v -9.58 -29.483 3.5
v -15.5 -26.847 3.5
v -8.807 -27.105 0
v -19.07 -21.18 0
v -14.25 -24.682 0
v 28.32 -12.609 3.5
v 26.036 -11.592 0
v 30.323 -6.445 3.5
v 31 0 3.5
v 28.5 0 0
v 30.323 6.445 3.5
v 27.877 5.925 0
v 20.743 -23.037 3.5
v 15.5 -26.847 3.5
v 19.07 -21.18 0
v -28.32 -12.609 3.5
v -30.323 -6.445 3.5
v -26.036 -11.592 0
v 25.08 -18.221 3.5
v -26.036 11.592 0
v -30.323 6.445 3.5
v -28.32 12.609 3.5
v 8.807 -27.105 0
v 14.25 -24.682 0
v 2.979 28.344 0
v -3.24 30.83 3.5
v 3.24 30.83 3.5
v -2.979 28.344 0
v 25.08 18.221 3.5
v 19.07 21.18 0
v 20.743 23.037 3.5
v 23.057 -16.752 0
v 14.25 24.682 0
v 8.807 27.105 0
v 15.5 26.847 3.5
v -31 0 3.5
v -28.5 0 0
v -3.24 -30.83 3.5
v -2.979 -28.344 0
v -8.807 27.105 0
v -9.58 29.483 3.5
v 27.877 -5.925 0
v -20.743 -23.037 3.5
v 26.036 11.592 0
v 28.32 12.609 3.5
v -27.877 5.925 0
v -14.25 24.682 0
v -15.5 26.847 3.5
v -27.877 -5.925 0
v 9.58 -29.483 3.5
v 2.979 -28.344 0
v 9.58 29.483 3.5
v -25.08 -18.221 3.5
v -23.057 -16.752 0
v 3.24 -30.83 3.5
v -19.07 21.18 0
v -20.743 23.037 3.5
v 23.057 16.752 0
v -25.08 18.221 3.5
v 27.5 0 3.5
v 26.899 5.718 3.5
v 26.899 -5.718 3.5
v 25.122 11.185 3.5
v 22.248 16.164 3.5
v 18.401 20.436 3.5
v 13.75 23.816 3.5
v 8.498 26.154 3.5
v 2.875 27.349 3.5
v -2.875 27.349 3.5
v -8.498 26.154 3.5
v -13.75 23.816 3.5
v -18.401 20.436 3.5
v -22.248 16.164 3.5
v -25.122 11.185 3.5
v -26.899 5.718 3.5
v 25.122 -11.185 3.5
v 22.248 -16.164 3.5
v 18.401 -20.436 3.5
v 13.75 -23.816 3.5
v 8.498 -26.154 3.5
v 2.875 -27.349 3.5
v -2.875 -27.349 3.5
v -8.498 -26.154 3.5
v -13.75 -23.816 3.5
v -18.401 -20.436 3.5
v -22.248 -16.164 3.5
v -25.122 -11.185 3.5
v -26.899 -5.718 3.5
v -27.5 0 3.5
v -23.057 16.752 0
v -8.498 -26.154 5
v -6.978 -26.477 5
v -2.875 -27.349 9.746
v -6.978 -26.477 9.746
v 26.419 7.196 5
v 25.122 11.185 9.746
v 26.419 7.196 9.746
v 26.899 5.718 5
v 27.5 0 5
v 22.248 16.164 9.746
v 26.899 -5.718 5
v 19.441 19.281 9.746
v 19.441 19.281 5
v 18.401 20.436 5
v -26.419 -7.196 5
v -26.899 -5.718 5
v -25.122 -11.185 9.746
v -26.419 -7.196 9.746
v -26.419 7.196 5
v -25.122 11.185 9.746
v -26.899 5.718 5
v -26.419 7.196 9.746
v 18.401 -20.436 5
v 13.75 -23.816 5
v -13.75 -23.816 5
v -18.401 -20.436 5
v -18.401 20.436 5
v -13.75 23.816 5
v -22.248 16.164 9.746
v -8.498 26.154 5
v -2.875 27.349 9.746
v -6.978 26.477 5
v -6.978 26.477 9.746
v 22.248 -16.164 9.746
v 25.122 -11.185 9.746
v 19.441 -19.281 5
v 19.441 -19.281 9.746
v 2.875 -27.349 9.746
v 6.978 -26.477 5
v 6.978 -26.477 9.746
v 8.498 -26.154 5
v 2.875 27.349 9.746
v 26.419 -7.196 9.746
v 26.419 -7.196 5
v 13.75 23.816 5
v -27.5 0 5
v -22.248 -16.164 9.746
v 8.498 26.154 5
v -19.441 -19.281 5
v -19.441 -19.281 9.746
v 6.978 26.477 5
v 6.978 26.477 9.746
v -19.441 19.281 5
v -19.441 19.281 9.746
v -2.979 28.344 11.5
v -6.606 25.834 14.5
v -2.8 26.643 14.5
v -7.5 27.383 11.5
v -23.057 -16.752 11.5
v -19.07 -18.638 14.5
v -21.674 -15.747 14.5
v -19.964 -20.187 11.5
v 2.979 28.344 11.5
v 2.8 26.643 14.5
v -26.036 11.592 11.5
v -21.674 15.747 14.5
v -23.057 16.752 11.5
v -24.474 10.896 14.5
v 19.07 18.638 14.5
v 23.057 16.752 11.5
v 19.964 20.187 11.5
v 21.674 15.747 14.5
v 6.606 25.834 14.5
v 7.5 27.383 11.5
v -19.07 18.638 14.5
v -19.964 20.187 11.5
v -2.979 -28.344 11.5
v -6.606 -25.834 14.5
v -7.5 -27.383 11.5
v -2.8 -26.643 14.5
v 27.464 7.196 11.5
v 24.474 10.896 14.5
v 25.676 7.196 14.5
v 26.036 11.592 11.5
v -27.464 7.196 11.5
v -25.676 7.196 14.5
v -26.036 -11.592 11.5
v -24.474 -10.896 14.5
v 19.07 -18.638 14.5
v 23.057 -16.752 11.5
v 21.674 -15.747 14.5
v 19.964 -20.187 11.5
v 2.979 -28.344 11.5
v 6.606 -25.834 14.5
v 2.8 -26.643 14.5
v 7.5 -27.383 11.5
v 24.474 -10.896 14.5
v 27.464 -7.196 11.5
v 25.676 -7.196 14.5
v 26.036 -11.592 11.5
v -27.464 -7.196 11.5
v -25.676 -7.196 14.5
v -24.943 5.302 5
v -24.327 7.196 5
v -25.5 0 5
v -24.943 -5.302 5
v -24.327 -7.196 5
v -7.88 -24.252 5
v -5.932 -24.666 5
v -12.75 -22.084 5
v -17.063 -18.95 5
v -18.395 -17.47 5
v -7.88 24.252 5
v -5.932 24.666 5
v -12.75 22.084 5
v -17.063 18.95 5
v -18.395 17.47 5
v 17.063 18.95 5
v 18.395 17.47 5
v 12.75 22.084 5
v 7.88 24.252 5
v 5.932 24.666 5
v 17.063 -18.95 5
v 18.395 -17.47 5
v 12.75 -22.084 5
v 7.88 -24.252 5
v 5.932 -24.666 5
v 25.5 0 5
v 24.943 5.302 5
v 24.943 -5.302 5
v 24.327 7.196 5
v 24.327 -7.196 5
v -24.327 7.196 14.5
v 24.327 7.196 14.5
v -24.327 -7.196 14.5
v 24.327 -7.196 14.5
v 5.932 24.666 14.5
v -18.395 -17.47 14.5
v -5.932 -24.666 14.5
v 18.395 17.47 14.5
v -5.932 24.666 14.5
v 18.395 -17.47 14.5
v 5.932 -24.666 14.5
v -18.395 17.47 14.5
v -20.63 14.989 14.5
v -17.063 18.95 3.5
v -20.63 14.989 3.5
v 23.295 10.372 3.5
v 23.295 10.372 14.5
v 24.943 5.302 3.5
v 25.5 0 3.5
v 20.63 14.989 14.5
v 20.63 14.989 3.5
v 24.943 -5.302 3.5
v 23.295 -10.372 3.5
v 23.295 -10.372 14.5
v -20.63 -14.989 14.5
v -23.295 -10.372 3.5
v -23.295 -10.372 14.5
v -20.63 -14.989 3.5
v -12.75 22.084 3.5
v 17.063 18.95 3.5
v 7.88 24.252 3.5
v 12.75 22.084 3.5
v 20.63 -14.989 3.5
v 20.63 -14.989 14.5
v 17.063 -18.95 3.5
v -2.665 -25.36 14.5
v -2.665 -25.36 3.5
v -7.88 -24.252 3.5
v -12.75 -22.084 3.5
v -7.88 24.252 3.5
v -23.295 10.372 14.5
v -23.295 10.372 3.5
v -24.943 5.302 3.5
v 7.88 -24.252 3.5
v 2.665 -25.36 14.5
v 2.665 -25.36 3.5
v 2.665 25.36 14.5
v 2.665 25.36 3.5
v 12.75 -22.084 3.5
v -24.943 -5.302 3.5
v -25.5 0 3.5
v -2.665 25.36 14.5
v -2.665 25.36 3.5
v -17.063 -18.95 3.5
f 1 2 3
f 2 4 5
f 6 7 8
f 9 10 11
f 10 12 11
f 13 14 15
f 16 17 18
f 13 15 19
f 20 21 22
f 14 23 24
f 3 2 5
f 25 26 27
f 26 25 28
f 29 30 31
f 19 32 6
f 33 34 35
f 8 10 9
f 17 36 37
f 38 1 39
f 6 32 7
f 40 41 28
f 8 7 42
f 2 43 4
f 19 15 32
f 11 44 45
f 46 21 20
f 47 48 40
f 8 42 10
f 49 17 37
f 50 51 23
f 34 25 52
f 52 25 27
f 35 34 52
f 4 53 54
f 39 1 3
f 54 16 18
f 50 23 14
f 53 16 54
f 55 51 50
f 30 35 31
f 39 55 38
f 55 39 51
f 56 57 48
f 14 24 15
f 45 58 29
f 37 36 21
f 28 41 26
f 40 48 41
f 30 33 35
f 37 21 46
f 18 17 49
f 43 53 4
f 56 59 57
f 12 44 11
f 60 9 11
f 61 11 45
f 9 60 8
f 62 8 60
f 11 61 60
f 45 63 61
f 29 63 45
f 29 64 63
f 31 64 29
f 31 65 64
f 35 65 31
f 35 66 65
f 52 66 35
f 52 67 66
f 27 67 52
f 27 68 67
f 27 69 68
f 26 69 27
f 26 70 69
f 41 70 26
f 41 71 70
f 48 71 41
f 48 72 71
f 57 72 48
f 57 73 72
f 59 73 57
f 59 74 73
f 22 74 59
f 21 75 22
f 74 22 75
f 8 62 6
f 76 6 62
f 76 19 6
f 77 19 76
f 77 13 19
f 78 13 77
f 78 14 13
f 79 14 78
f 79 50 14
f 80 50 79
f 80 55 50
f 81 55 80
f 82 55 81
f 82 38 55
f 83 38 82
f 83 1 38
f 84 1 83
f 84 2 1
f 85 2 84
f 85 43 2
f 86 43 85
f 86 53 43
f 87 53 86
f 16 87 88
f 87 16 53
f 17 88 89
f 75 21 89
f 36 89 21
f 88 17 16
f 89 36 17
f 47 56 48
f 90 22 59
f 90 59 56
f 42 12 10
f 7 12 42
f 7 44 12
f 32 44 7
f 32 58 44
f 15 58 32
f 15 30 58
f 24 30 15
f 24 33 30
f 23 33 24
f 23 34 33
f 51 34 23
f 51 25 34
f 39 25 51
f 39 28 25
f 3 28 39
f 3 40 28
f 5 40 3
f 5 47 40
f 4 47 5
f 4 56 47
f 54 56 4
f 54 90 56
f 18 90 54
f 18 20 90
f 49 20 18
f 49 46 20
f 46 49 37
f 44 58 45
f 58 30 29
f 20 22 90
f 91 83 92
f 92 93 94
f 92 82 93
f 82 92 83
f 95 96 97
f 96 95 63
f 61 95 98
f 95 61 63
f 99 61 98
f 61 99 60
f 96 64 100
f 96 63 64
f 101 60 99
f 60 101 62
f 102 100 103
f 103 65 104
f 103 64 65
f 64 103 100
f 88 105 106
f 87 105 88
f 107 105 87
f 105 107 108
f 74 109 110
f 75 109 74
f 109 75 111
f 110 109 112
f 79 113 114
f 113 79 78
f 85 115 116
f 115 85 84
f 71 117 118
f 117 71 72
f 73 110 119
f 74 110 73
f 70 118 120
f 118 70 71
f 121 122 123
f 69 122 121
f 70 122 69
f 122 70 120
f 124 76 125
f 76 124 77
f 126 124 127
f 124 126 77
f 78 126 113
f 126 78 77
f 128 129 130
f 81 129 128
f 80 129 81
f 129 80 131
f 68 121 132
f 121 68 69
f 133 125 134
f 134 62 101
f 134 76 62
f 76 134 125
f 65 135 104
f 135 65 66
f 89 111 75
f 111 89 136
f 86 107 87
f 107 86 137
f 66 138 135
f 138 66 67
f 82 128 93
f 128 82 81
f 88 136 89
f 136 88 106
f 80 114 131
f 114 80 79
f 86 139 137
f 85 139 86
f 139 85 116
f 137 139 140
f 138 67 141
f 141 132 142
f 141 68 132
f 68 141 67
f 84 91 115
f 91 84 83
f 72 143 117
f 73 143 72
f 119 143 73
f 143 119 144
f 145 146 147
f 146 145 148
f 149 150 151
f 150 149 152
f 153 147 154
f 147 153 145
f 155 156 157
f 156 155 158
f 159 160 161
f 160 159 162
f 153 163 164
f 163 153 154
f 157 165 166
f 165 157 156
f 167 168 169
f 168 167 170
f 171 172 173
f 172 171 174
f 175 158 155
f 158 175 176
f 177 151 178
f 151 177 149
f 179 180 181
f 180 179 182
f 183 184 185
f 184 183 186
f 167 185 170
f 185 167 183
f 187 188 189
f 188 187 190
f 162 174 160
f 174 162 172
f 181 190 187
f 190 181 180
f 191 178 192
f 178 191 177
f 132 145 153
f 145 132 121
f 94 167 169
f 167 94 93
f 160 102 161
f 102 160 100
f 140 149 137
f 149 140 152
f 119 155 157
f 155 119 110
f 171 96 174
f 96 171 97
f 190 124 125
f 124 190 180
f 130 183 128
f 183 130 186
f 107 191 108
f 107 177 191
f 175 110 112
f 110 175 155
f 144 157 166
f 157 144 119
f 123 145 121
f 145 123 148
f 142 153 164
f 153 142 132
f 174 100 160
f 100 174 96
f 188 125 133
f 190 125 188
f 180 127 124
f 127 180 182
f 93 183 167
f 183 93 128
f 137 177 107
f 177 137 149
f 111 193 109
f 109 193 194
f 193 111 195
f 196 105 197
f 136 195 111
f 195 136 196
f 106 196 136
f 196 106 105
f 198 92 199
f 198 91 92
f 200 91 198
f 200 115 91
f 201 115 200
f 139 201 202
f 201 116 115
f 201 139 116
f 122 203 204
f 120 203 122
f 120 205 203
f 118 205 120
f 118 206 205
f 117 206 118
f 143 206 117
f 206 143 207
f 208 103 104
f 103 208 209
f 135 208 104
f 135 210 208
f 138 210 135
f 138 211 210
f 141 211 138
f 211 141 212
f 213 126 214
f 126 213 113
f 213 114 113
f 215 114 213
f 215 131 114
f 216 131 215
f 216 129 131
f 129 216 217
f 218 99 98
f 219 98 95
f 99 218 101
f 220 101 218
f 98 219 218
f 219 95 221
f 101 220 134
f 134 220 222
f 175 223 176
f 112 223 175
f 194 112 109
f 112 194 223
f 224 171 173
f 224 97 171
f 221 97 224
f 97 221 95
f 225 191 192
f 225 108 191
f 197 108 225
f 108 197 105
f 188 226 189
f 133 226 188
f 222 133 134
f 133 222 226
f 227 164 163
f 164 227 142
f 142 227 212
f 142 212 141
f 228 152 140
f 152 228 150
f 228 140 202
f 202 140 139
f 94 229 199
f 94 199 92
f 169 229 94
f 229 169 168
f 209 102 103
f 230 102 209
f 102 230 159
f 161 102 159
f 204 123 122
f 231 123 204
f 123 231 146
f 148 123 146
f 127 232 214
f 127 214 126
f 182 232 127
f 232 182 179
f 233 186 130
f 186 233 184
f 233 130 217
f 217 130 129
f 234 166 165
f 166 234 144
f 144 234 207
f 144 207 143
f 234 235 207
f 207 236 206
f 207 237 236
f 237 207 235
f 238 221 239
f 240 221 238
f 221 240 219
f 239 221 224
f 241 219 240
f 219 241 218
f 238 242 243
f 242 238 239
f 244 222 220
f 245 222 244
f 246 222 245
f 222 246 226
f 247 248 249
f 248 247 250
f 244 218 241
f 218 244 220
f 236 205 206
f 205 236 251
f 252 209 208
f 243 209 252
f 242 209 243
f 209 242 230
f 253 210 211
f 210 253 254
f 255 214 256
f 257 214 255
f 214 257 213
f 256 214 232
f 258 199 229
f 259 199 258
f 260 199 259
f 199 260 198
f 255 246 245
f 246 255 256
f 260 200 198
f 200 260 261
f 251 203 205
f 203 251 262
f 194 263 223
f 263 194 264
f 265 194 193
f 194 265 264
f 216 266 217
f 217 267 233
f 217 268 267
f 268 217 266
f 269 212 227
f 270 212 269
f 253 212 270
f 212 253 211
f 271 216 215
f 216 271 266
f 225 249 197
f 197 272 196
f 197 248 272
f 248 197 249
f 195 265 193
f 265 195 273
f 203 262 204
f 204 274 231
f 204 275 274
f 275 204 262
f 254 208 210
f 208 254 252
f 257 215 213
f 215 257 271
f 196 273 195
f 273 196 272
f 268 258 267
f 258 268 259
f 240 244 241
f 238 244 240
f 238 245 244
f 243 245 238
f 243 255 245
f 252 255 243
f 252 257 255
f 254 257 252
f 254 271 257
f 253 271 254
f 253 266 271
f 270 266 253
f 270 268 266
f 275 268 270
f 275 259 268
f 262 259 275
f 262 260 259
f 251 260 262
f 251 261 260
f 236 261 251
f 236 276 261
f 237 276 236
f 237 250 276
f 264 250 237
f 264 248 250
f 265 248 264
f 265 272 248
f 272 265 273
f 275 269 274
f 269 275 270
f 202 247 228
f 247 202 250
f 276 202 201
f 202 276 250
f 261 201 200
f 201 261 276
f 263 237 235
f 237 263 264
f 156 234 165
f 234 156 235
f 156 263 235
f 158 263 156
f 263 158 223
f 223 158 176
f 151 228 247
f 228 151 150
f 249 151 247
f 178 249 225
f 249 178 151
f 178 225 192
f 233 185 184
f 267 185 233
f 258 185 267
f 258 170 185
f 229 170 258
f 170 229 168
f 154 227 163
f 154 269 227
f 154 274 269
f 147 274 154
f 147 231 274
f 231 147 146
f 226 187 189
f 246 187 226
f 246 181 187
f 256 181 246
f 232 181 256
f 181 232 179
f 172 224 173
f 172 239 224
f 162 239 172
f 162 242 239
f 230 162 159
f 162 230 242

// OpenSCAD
//Edit these parameters
diameter_inner = 55;    //Inner diameter of plugging hole from 10 - 98
wall_thickness = 4;     //Keep this to a sane value for good flex
tap_hight = 8;          //How far inn is the groove?
emblem_hight= 3.5;      //How thick do you want it?
faces = 30;             //how smooth do you want it?
clipthickness = 2;      //How deep is your groove?
tapsmooth = 50;         //How sharp angle do you want on your tap
clipnumbers = 6;        //Keep to even numbers
autoclipspace = ((diameter_inner * 3.14)/clipnumbers)/2;//math
clipspace = autoclipspace;//Can be replaced with guesswork.
emblem_inner = diameter_inner + 7; //Brimsize close to the hole.   
emblem_outer = diameter_inner + 2; //Brimsize close to the bottom.


//math to make scaling work.
insight_cut= diameter_inner - wall_thickness;
tap_hight_from_0 = tap_hight + emblem_hight;
total_hight = tap_hight_from_0 + 5;
clipwide = diameter_inner + clipthickness;
cylindertop = tap_hight_from_0;
cylinderbottom =  cylindertop - tapsmooth;
cutouthight = tapsmooth;
topcut = 50 + tap_hight_from_0 + 3;
block_nr = clipnumbers;
blockangle = 360 / block_nr;
audidiameter = (emblem_outer/4)/2;
ringthickness = 1* diameter_inner/60;

//Module for audi logo.
module audiring (diameter= 60, offset= 0)  {
    translate([offset,0,0]){
        rotate_extrude(convexity=10,$fn=faces)
        translate([diameter,0,0])
        circle(r=ringthickness,$fn=faces);
    }
}


difference() {
    //Basic shape
    union() {
    // Cone, face
    cylinder(d2=emblem_inner, d1=emblem_outer, h=emblem_hight, $fn=faces );
    // Cylinder, interior clip
    cylinder(d=diameter_inner, h=tap_hight_from_0);
        
    // upper wedge on clip
    translate(v=[0,0,cylindertop])
    cylinder(d2=0, d1=clipwide, h=tapsmooth);
    // lower wedge on clip
    translate(v=[0,0,cylinderbottom])
    cylinder(d1=0, d2=clipwide, h=tapsmooth);  
        



    };
    //***** Comment out if you have audi ;)*****
    //******************************************
    //audiring (audidiameter, emblem_outer/12);
    //audiring (audidiameter, emblem_outer/4);
    //audiring (audidiameter, -emblem_outer/12);
    //audiring (audidiameter, -emblem_outer/4);
    //******************************************
    
    //************ Text example ****************
    //******************************************
    //translate([20, -emblem_outer/3, 0])
    //mirror([1,0,0]){
    //linear_extrude(0.4)
    //    text("TEXT-Example", size = 4);
    //}
    //******************************************
    
    
    // Cut out the interior of interior clip
    translate(v=[0,0,emblem_hight])
        cylinder( d=insight_cut, h=cutouthight);
    // Slice off top and bottom of the cap
    translate([0,0,-50])
        cube(center=true,[clipwide,clipwide,100]);
    translate([0,0,topcut])
        cube(center=true,[clipwide,clipwide,100]);
    
    
    //Function for getting scalable clip's
        for( i = [0:block_nr]) {
        rotate(a=[0,0,blockangle*i])
            translate([0, 0, 30])
                cube(center=true,[100, clipspace, 50]);
            
    };
       
}
